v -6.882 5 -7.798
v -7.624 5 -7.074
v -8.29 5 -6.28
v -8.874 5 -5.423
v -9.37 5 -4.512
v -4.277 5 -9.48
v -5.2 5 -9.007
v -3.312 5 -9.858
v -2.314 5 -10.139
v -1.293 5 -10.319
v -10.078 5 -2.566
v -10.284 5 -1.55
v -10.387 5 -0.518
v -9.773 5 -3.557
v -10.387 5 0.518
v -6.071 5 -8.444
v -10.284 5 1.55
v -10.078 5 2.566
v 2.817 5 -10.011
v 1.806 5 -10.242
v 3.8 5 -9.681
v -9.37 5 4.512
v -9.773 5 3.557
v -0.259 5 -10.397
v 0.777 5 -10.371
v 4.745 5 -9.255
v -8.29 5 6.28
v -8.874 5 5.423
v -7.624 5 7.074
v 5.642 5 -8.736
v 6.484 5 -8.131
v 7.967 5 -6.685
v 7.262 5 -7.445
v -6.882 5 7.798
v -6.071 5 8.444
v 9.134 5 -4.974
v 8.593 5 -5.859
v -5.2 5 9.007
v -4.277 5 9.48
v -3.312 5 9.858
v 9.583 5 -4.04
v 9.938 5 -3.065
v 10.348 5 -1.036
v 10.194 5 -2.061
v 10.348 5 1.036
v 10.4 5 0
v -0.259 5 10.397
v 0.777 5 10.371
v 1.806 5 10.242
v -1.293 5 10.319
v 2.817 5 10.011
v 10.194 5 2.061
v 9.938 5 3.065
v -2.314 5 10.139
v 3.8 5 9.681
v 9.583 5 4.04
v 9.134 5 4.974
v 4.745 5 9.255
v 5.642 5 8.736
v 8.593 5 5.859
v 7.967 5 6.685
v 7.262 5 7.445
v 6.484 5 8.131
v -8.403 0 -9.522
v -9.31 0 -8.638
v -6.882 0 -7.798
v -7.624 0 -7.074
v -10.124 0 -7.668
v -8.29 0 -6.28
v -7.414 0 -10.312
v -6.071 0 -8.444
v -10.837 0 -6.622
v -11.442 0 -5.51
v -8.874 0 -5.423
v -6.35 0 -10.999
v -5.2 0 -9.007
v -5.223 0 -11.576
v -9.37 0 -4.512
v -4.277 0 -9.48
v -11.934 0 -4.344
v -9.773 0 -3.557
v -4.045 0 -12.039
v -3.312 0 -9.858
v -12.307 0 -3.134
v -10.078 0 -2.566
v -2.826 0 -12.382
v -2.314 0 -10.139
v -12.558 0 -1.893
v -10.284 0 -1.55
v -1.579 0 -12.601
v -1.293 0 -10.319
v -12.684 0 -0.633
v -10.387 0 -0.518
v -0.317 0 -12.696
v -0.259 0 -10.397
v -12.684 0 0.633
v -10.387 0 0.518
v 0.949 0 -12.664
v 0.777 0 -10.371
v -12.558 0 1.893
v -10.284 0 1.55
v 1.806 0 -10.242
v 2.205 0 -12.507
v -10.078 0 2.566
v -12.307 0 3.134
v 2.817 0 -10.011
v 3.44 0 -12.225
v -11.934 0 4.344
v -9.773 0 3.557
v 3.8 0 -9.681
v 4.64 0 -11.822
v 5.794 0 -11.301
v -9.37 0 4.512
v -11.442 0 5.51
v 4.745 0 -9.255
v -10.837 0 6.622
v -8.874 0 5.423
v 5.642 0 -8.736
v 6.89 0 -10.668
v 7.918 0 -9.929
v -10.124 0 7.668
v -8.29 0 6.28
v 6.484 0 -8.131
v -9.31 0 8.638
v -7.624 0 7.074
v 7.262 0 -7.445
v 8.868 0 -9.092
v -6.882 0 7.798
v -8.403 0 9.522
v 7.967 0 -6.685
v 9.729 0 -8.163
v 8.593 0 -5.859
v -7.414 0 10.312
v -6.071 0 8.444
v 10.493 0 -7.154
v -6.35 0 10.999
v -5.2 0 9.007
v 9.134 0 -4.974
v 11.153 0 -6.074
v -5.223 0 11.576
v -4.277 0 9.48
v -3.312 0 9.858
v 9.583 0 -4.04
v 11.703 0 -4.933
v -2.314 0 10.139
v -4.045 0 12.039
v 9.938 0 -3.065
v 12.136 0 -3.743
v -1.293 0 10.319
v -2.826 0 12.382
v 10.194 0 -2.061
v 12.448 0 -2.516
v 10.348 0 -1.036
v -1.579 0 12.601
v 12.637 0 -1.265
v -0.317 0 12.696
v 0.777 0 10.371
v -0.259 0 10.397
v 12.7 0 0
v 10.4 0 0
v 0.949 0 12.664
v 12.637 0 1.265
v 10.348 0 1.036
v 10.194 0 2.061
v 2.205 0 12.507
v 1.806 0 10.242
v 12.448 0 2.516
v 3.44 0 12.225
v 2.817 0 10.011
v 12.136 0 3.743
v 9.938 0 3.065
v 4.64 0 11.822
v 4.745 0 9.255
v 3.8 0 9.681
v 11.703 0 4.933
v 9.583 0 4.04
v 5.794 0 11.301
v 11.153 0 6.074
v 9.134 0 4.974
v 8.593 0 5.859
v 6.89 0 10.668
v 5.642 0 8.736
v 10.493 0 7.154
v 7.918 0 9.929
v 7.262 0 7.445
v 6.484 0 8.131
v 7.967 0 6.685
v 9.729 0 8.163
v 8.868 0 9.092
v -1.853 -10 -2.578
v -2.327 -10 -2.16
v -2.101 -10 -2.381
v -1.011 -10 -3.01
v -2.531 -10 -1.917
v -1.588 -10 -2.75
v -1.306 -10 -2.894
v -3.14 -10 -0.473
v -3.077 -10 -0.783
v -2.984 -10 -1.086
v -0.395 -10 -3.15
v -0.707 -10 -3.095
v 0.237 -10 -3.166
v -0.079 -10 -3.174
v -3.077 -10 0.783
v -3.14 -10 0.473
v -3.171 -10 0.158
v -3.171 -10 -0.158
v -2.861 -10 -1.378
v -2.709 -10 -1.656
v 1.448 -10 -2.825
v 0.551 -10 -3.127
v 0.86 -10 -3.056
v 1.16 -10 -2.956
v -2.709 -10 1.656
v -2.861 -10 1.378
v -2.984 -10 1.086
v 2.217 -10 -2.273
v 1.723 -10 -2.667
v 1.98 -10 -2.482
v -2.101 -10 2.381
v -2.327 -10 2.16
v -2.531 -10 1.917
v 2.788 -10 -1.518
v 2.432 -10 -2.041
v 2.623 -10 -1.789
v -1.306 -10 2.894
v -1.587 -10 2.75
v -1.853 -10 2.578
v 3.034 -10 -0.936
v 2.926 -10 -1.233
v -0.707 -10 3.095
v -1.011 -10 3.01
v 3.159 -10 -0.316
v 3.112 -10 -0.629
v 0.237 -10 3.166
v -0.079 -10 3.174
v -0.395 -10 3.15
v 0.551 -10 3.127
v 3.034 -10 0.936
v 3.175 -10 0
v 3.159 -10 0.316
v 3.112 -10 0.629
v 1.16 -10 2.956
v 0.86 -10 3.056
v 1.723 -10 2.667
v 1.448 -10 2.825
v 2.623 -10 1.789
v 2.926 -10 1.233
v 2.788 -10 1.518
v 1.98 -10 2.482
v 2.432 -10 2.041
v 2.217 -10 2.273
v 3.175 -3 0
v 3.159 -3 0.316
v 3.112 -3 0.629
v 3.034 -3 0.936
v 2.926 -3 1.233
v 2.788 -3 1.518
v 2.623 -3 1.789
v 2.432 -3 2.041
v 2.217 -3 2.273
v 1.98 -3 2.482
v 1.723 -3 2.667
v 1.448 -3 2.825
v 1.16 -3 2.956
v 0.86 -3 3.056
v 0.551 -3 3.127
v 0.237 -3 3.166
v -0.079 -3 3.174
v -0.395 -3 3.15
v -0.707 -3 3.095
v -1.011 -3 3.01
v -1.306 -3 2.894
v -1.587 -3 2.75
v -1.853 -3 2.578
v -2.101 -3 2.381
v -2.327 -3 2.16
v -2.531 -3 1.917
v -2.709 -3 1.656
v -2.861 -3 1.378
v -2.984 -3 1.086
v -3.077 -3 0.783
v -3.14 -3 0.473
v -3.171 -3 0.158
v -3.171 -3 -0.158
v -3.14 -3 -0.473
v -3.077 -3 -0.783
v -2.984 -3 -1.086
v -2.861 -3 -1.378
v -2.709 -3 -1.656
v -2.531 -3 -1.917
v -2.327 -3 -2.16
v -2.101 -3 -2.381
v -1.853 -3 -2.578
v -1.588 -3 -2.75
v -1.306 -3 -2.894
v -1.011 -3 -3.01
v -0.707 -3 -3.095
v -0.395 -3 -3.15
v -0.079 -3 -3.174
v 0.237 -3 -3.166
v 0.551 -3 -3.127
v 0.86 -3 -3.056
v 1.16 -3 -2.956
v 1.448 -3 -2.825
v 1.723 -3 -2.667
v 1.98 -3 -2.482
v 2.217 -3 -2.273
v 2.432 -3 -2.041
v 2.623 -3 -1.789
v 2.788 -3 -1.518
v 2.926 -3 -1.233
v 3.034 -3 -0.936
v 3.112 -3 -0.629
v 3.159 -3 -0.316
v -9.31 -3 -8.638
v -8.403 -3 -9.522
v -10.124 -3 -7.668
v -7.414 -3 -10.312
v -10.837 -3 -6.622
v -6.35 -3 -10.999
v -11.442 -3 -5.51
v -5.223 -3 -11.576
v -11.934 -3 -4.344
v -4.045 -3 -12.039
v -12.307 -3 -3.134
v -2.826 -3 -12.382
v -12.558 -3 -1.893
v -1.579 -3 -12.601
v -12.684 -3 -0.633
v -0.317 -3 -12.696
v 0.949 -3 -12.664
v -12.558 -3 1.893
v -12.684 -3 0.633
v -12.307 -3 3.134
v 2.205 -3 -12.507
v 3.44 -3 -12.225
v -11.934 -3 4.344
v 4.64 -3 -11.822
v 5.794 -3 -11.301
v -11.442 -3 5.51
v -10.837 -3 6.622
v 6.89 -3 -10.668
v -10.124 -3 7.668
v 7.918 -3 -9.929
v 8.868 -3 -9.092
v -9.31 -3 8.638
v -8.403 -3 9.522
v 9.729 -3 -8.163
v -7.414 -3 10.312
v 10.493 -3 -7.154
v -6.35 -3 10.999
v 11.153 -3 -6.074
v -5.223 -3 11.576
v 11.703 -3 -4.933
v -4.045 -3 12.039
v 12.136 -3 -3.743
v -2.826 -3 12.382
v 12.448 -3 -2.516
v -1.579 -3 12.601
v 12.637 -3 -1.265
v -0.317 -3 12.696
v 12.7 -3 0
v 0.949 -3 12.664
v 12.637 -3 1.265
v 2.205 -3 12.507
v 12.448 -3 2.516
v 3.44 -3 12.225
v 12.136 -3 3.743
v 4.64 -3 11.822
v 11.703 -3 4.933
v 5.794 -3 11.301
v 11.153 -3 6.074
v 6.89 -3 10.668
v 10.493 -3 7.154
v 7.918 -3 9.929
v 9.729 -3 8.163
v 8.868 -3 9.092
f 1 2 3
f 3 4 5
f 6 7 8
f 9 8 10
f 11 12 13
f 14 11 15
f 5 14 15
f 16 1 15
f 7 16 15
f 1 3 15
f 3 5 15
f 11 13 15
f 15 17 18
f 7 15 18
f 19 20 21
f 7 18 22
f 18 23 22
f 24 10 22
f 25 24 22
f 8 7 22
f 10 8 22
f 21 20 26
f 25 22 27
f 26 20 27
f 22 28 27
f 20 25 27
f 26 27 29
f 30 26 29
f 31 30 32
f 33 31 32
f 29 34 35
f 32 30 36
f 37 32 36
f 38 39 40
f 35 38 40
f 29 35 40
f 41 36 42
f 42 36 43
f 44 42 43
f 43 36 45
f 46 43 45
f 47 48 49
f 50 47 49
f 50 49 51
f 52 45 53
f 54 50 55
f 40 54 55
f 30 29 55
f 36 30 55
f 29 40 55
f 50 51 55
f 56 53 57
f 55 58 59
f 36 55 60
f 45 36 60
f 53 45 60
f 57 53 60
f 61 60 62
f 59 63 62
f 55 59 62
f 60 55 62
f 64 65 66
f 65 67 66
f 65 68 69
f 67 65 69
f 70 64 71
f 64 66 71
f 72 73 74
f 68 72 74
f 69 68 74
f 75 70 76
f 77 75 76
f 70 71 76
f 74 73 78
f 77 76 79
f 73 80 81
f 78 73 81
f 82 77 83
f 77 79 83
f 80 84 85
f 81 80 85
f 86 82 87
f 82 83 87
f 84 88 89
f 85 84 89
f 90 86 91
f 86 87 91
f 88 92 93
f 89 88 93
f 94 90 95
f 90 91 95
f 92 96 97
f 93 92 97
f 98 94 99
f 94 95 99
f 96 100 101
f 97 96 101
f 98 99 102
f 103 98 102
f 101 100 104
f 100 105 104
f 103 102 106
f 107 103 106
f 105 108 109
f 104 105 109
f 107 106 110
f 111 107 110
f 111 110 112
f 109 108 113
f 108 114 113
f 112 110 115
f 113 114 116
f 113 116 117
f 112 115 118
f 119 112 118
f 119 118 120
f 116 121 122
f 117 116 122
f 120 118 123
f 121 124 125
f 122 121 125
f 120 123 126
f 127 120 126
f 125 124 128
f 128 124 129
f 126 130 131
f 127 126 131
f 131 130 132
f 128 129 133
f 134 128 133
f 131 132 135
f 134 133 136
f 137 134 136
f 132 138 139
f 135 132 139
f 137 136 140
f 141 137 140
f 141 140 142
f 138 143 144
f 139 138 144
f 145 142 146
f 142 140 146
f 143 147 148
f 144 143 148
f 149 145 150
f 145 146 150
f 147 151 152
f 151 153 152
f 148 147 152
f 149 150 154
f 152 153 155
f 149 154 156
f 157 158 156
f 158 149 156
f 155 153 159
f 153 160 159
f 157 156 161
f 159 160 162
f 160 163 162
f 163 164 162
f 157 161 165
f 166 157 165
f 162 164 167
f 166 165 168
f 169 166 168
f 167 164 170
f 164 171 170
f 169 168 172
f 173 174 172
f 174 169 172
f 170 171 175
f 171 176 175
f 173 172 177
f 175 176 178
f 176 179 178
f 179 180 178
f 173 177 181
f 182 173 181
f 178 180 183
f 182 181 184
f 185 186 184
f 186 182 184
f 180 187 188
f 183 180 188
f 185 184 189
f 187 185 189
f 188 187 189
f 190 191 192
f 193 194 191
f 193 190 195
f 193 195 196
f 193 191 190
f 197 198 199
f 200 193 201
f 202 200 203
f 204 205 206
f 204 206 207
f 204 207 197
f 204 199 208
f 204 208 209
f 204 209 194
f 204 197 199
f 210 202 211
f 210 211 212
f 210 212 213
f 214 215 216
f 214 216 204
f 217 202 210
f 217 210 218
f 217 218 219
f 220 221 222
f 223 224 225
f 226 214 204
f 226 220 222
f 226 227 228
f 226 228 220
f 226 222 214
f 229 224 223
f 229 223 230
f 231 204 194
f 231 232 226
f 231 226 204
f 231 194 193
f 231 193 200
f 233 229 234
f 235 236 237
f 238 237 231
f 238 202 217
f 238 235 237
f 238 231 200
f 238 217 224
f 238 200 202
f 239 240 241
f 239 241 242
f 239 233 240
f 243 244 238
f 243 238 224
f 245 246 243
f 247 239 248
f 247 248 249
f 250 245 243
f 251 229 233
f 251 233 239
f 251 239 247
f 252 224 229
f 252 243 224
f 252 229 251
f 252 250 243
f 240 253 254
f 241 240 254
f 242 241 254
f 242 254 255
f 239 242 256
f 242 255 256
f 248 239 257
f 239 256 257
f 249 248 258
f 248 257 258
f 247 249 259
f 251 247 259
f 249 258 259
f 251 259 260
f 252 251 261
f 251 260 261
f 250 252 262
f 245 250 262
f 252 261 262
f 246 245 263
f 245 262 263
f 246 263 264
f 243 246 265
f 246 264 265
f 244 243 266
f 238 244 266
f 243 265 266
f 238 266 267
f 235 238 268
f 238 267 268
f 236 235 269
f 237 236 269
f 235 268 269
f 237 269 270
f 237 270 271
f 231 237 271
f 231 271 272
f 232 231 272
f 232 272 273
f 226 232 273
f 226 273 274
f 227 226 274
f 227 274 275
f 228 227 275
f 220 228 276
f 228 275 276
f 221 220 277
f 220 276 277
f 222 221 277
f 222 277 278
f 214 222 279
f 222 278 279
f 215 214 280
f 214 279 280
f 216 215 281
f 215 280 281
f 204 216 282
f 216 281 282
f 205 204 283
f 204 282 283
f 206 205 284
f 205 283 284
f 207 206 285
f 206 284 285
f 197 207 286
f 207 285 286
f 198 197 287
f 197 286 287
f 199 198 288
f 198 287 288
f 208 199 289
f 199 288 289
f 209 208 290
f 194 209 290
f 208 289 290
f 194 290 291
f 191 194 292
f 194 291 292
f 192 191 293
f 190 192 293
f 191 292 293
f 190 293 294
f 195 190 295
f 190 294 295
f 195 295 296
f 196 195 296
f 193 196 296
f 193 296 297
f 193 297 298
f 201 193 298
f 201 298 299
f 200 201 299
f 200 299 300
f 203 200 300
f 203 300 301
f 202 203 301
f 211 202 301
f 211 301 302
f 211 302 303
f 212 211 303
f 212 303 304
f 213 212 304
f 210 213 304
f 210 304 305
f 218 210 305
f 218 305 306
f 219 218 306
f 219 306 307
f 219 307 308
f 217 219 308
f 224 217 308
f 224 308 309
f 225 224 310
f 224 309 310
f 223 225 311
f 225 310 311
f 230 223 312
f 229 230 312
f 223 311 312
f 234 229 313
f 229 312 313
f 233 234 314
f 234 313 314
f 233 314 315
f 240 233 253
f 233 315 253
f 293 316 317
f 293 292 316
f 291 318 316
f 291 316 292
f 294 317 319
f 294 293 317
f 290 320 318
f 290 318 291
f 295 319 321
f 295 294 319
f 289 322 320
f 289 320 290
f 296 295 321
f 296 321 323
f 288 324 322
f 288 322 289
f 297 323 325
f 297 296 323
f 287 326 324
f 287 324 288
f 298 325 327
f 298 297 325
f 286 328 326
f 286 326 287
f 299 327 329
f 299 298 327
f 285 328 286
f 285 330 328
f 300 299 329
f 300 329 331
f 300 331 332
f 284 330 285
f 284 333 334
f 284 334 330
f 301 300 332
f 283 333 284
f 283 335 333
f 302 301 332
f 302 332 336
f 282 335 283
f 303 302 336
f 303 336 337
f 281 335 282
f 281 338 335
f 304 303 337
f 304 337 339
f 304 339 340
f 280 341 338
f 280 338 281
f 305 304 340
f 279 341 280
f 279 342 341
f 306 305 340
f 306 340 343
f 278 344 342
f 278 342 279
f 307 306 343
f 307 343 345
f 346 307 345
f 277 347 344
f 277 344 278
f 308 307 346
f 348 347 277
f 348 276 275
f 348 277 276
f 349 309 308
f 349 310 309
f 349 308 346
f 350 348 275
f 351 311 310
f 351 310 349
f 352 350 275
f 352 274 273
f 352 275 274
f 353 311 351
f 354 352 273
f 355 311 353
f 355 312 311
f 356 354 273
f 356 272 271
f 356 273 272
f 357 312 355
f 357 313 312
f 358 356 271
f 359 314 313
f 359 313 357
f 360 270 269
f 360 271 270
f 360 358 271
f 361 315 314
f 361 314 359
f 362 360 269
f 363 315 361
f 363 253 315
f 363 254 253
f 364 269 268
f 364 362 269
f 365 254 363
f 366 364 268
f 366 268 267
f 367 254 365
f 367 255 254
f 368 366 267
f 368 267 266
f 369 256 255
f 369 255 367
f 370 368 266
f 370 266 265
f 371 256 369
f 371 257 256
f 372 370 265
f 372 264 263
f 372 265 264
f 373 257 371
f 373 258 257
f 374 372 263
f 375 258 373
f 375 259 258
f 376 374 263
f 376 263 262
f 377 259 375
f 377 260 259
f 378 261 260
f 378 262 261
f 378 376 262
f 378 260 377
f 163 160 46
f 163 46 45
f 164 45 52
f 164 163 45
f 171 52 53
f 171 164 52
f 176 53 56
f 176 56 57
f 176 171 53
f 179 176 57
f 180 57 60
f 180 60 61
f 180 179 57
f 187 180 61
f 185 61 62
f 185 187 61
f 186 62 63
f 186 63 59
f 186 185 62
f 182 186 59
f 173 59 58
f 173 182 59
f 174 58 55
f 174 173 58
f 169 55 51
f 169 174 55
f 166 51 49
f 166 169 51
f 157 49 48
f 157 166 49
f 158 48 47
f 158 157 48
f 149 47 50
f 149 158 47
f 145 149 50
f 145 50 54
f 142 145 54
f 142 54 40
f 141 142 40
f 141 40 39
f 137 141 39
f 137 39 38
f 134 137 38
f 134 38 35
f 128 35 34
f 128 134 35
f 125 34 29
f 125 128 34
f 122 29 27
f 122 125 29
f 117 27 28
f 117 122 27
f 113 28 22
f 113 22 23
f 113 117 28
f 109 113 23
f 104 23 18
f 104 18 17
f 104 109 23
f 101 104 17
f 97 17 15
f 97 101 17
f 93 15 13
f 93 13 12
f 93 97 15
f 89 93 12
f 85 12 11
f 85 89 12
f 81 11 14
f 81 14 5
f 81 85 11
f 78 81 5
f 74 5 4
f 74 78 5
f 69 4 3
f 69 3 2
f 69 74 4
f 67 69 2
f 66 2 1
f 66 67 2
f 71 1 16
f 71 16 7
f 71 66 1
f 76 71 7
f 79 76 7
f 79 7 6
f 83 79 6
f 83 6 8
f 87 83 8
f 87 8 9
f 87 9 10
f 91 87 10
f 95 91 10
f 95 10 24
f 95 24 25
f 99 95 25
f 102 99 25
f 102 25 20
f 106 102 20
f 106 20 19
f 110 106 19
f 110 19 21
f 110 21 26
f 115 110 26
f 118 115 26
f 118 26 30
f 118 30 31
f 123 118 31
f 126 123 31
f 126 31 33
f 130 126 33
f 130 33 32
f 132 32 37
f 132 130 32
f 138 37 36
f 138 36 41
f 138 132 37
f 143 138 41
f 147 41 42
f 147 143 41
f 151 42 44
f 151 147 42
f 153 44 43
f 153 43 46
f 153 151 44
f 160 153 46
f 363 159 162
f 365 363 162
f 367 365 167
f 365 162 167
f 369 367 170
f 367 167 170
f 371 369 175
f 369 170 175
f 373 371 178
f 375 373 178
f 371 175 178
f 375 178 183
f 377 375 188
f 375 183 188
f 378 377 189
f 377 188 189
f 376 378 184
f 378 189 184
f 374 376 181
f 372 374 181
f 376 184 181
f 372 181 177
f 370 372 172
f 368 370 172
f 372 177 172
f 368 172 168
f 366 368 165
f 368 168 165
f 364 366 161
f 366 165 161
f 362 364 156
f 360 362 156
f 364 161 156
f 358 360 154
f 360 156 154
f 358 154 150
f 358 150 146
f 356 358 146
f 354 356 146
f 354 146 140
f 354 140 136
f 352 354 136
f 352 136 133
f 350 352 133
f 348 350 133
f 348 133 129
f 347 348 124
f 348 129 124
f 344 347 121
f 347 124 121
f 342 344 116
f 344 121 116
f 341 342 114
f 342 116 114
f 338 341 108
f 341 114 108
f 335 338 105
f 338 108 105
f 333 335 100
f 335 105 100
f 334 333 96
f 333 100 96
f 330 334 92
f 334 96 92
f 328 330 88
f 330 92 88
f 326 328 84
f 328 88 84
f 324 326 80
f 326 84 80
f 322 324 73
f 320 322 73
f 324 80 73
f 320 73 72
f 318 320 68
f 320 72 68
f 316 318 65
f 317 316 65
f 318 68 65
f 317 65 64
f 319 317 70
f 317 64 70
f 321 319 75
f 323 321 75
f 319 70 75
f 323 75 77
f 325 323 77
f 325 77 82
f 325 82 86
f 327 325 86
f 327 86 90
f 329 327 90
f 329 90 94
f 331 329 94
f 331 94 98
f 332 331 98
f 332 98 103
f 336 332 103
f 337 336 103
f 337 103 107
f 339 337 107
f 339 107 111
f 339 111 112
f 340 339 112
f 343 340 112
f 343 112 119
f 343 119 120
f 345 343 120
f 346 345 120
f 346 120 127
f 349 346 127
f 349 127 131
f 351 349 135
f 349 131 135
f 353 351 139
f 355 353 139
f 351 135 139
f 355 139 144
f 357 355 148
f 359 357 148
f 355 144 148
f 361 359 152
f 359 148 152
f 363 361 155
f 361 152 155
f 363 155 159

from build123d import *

# Parameters (mm, degrees)
F0_R     = 10.4
F1_DEPTH = 5
F0_R_2   = 12.7
F2_DEPTH = 3
F3_R     = 3.175
F4_DEPTH = 7


with BuildPart() as f1:
    # F0 (on Front) → F1 (new body)
    with BuildSketch(Plane.XZ):
        Circle(F0_R)
    extrude(amount=-F1_DEPTH)

    # F0 (on Front) → F2 (join)
    with BuildSketch(Plane.XZ):
        Circle(F0_R_2)
        Circle(F0_R, mode=Mode.SUBTRACT)
        Circle(F0_R)
    extrude(amount=F2_DEPTH)

    # F3 (on face) → F4 (join)
    with BuildSketch(Plane.XZ.offset(3)):
        Circle(F3_R)
    extrude(amount=F4_DEPTH)


solid = f1.part
